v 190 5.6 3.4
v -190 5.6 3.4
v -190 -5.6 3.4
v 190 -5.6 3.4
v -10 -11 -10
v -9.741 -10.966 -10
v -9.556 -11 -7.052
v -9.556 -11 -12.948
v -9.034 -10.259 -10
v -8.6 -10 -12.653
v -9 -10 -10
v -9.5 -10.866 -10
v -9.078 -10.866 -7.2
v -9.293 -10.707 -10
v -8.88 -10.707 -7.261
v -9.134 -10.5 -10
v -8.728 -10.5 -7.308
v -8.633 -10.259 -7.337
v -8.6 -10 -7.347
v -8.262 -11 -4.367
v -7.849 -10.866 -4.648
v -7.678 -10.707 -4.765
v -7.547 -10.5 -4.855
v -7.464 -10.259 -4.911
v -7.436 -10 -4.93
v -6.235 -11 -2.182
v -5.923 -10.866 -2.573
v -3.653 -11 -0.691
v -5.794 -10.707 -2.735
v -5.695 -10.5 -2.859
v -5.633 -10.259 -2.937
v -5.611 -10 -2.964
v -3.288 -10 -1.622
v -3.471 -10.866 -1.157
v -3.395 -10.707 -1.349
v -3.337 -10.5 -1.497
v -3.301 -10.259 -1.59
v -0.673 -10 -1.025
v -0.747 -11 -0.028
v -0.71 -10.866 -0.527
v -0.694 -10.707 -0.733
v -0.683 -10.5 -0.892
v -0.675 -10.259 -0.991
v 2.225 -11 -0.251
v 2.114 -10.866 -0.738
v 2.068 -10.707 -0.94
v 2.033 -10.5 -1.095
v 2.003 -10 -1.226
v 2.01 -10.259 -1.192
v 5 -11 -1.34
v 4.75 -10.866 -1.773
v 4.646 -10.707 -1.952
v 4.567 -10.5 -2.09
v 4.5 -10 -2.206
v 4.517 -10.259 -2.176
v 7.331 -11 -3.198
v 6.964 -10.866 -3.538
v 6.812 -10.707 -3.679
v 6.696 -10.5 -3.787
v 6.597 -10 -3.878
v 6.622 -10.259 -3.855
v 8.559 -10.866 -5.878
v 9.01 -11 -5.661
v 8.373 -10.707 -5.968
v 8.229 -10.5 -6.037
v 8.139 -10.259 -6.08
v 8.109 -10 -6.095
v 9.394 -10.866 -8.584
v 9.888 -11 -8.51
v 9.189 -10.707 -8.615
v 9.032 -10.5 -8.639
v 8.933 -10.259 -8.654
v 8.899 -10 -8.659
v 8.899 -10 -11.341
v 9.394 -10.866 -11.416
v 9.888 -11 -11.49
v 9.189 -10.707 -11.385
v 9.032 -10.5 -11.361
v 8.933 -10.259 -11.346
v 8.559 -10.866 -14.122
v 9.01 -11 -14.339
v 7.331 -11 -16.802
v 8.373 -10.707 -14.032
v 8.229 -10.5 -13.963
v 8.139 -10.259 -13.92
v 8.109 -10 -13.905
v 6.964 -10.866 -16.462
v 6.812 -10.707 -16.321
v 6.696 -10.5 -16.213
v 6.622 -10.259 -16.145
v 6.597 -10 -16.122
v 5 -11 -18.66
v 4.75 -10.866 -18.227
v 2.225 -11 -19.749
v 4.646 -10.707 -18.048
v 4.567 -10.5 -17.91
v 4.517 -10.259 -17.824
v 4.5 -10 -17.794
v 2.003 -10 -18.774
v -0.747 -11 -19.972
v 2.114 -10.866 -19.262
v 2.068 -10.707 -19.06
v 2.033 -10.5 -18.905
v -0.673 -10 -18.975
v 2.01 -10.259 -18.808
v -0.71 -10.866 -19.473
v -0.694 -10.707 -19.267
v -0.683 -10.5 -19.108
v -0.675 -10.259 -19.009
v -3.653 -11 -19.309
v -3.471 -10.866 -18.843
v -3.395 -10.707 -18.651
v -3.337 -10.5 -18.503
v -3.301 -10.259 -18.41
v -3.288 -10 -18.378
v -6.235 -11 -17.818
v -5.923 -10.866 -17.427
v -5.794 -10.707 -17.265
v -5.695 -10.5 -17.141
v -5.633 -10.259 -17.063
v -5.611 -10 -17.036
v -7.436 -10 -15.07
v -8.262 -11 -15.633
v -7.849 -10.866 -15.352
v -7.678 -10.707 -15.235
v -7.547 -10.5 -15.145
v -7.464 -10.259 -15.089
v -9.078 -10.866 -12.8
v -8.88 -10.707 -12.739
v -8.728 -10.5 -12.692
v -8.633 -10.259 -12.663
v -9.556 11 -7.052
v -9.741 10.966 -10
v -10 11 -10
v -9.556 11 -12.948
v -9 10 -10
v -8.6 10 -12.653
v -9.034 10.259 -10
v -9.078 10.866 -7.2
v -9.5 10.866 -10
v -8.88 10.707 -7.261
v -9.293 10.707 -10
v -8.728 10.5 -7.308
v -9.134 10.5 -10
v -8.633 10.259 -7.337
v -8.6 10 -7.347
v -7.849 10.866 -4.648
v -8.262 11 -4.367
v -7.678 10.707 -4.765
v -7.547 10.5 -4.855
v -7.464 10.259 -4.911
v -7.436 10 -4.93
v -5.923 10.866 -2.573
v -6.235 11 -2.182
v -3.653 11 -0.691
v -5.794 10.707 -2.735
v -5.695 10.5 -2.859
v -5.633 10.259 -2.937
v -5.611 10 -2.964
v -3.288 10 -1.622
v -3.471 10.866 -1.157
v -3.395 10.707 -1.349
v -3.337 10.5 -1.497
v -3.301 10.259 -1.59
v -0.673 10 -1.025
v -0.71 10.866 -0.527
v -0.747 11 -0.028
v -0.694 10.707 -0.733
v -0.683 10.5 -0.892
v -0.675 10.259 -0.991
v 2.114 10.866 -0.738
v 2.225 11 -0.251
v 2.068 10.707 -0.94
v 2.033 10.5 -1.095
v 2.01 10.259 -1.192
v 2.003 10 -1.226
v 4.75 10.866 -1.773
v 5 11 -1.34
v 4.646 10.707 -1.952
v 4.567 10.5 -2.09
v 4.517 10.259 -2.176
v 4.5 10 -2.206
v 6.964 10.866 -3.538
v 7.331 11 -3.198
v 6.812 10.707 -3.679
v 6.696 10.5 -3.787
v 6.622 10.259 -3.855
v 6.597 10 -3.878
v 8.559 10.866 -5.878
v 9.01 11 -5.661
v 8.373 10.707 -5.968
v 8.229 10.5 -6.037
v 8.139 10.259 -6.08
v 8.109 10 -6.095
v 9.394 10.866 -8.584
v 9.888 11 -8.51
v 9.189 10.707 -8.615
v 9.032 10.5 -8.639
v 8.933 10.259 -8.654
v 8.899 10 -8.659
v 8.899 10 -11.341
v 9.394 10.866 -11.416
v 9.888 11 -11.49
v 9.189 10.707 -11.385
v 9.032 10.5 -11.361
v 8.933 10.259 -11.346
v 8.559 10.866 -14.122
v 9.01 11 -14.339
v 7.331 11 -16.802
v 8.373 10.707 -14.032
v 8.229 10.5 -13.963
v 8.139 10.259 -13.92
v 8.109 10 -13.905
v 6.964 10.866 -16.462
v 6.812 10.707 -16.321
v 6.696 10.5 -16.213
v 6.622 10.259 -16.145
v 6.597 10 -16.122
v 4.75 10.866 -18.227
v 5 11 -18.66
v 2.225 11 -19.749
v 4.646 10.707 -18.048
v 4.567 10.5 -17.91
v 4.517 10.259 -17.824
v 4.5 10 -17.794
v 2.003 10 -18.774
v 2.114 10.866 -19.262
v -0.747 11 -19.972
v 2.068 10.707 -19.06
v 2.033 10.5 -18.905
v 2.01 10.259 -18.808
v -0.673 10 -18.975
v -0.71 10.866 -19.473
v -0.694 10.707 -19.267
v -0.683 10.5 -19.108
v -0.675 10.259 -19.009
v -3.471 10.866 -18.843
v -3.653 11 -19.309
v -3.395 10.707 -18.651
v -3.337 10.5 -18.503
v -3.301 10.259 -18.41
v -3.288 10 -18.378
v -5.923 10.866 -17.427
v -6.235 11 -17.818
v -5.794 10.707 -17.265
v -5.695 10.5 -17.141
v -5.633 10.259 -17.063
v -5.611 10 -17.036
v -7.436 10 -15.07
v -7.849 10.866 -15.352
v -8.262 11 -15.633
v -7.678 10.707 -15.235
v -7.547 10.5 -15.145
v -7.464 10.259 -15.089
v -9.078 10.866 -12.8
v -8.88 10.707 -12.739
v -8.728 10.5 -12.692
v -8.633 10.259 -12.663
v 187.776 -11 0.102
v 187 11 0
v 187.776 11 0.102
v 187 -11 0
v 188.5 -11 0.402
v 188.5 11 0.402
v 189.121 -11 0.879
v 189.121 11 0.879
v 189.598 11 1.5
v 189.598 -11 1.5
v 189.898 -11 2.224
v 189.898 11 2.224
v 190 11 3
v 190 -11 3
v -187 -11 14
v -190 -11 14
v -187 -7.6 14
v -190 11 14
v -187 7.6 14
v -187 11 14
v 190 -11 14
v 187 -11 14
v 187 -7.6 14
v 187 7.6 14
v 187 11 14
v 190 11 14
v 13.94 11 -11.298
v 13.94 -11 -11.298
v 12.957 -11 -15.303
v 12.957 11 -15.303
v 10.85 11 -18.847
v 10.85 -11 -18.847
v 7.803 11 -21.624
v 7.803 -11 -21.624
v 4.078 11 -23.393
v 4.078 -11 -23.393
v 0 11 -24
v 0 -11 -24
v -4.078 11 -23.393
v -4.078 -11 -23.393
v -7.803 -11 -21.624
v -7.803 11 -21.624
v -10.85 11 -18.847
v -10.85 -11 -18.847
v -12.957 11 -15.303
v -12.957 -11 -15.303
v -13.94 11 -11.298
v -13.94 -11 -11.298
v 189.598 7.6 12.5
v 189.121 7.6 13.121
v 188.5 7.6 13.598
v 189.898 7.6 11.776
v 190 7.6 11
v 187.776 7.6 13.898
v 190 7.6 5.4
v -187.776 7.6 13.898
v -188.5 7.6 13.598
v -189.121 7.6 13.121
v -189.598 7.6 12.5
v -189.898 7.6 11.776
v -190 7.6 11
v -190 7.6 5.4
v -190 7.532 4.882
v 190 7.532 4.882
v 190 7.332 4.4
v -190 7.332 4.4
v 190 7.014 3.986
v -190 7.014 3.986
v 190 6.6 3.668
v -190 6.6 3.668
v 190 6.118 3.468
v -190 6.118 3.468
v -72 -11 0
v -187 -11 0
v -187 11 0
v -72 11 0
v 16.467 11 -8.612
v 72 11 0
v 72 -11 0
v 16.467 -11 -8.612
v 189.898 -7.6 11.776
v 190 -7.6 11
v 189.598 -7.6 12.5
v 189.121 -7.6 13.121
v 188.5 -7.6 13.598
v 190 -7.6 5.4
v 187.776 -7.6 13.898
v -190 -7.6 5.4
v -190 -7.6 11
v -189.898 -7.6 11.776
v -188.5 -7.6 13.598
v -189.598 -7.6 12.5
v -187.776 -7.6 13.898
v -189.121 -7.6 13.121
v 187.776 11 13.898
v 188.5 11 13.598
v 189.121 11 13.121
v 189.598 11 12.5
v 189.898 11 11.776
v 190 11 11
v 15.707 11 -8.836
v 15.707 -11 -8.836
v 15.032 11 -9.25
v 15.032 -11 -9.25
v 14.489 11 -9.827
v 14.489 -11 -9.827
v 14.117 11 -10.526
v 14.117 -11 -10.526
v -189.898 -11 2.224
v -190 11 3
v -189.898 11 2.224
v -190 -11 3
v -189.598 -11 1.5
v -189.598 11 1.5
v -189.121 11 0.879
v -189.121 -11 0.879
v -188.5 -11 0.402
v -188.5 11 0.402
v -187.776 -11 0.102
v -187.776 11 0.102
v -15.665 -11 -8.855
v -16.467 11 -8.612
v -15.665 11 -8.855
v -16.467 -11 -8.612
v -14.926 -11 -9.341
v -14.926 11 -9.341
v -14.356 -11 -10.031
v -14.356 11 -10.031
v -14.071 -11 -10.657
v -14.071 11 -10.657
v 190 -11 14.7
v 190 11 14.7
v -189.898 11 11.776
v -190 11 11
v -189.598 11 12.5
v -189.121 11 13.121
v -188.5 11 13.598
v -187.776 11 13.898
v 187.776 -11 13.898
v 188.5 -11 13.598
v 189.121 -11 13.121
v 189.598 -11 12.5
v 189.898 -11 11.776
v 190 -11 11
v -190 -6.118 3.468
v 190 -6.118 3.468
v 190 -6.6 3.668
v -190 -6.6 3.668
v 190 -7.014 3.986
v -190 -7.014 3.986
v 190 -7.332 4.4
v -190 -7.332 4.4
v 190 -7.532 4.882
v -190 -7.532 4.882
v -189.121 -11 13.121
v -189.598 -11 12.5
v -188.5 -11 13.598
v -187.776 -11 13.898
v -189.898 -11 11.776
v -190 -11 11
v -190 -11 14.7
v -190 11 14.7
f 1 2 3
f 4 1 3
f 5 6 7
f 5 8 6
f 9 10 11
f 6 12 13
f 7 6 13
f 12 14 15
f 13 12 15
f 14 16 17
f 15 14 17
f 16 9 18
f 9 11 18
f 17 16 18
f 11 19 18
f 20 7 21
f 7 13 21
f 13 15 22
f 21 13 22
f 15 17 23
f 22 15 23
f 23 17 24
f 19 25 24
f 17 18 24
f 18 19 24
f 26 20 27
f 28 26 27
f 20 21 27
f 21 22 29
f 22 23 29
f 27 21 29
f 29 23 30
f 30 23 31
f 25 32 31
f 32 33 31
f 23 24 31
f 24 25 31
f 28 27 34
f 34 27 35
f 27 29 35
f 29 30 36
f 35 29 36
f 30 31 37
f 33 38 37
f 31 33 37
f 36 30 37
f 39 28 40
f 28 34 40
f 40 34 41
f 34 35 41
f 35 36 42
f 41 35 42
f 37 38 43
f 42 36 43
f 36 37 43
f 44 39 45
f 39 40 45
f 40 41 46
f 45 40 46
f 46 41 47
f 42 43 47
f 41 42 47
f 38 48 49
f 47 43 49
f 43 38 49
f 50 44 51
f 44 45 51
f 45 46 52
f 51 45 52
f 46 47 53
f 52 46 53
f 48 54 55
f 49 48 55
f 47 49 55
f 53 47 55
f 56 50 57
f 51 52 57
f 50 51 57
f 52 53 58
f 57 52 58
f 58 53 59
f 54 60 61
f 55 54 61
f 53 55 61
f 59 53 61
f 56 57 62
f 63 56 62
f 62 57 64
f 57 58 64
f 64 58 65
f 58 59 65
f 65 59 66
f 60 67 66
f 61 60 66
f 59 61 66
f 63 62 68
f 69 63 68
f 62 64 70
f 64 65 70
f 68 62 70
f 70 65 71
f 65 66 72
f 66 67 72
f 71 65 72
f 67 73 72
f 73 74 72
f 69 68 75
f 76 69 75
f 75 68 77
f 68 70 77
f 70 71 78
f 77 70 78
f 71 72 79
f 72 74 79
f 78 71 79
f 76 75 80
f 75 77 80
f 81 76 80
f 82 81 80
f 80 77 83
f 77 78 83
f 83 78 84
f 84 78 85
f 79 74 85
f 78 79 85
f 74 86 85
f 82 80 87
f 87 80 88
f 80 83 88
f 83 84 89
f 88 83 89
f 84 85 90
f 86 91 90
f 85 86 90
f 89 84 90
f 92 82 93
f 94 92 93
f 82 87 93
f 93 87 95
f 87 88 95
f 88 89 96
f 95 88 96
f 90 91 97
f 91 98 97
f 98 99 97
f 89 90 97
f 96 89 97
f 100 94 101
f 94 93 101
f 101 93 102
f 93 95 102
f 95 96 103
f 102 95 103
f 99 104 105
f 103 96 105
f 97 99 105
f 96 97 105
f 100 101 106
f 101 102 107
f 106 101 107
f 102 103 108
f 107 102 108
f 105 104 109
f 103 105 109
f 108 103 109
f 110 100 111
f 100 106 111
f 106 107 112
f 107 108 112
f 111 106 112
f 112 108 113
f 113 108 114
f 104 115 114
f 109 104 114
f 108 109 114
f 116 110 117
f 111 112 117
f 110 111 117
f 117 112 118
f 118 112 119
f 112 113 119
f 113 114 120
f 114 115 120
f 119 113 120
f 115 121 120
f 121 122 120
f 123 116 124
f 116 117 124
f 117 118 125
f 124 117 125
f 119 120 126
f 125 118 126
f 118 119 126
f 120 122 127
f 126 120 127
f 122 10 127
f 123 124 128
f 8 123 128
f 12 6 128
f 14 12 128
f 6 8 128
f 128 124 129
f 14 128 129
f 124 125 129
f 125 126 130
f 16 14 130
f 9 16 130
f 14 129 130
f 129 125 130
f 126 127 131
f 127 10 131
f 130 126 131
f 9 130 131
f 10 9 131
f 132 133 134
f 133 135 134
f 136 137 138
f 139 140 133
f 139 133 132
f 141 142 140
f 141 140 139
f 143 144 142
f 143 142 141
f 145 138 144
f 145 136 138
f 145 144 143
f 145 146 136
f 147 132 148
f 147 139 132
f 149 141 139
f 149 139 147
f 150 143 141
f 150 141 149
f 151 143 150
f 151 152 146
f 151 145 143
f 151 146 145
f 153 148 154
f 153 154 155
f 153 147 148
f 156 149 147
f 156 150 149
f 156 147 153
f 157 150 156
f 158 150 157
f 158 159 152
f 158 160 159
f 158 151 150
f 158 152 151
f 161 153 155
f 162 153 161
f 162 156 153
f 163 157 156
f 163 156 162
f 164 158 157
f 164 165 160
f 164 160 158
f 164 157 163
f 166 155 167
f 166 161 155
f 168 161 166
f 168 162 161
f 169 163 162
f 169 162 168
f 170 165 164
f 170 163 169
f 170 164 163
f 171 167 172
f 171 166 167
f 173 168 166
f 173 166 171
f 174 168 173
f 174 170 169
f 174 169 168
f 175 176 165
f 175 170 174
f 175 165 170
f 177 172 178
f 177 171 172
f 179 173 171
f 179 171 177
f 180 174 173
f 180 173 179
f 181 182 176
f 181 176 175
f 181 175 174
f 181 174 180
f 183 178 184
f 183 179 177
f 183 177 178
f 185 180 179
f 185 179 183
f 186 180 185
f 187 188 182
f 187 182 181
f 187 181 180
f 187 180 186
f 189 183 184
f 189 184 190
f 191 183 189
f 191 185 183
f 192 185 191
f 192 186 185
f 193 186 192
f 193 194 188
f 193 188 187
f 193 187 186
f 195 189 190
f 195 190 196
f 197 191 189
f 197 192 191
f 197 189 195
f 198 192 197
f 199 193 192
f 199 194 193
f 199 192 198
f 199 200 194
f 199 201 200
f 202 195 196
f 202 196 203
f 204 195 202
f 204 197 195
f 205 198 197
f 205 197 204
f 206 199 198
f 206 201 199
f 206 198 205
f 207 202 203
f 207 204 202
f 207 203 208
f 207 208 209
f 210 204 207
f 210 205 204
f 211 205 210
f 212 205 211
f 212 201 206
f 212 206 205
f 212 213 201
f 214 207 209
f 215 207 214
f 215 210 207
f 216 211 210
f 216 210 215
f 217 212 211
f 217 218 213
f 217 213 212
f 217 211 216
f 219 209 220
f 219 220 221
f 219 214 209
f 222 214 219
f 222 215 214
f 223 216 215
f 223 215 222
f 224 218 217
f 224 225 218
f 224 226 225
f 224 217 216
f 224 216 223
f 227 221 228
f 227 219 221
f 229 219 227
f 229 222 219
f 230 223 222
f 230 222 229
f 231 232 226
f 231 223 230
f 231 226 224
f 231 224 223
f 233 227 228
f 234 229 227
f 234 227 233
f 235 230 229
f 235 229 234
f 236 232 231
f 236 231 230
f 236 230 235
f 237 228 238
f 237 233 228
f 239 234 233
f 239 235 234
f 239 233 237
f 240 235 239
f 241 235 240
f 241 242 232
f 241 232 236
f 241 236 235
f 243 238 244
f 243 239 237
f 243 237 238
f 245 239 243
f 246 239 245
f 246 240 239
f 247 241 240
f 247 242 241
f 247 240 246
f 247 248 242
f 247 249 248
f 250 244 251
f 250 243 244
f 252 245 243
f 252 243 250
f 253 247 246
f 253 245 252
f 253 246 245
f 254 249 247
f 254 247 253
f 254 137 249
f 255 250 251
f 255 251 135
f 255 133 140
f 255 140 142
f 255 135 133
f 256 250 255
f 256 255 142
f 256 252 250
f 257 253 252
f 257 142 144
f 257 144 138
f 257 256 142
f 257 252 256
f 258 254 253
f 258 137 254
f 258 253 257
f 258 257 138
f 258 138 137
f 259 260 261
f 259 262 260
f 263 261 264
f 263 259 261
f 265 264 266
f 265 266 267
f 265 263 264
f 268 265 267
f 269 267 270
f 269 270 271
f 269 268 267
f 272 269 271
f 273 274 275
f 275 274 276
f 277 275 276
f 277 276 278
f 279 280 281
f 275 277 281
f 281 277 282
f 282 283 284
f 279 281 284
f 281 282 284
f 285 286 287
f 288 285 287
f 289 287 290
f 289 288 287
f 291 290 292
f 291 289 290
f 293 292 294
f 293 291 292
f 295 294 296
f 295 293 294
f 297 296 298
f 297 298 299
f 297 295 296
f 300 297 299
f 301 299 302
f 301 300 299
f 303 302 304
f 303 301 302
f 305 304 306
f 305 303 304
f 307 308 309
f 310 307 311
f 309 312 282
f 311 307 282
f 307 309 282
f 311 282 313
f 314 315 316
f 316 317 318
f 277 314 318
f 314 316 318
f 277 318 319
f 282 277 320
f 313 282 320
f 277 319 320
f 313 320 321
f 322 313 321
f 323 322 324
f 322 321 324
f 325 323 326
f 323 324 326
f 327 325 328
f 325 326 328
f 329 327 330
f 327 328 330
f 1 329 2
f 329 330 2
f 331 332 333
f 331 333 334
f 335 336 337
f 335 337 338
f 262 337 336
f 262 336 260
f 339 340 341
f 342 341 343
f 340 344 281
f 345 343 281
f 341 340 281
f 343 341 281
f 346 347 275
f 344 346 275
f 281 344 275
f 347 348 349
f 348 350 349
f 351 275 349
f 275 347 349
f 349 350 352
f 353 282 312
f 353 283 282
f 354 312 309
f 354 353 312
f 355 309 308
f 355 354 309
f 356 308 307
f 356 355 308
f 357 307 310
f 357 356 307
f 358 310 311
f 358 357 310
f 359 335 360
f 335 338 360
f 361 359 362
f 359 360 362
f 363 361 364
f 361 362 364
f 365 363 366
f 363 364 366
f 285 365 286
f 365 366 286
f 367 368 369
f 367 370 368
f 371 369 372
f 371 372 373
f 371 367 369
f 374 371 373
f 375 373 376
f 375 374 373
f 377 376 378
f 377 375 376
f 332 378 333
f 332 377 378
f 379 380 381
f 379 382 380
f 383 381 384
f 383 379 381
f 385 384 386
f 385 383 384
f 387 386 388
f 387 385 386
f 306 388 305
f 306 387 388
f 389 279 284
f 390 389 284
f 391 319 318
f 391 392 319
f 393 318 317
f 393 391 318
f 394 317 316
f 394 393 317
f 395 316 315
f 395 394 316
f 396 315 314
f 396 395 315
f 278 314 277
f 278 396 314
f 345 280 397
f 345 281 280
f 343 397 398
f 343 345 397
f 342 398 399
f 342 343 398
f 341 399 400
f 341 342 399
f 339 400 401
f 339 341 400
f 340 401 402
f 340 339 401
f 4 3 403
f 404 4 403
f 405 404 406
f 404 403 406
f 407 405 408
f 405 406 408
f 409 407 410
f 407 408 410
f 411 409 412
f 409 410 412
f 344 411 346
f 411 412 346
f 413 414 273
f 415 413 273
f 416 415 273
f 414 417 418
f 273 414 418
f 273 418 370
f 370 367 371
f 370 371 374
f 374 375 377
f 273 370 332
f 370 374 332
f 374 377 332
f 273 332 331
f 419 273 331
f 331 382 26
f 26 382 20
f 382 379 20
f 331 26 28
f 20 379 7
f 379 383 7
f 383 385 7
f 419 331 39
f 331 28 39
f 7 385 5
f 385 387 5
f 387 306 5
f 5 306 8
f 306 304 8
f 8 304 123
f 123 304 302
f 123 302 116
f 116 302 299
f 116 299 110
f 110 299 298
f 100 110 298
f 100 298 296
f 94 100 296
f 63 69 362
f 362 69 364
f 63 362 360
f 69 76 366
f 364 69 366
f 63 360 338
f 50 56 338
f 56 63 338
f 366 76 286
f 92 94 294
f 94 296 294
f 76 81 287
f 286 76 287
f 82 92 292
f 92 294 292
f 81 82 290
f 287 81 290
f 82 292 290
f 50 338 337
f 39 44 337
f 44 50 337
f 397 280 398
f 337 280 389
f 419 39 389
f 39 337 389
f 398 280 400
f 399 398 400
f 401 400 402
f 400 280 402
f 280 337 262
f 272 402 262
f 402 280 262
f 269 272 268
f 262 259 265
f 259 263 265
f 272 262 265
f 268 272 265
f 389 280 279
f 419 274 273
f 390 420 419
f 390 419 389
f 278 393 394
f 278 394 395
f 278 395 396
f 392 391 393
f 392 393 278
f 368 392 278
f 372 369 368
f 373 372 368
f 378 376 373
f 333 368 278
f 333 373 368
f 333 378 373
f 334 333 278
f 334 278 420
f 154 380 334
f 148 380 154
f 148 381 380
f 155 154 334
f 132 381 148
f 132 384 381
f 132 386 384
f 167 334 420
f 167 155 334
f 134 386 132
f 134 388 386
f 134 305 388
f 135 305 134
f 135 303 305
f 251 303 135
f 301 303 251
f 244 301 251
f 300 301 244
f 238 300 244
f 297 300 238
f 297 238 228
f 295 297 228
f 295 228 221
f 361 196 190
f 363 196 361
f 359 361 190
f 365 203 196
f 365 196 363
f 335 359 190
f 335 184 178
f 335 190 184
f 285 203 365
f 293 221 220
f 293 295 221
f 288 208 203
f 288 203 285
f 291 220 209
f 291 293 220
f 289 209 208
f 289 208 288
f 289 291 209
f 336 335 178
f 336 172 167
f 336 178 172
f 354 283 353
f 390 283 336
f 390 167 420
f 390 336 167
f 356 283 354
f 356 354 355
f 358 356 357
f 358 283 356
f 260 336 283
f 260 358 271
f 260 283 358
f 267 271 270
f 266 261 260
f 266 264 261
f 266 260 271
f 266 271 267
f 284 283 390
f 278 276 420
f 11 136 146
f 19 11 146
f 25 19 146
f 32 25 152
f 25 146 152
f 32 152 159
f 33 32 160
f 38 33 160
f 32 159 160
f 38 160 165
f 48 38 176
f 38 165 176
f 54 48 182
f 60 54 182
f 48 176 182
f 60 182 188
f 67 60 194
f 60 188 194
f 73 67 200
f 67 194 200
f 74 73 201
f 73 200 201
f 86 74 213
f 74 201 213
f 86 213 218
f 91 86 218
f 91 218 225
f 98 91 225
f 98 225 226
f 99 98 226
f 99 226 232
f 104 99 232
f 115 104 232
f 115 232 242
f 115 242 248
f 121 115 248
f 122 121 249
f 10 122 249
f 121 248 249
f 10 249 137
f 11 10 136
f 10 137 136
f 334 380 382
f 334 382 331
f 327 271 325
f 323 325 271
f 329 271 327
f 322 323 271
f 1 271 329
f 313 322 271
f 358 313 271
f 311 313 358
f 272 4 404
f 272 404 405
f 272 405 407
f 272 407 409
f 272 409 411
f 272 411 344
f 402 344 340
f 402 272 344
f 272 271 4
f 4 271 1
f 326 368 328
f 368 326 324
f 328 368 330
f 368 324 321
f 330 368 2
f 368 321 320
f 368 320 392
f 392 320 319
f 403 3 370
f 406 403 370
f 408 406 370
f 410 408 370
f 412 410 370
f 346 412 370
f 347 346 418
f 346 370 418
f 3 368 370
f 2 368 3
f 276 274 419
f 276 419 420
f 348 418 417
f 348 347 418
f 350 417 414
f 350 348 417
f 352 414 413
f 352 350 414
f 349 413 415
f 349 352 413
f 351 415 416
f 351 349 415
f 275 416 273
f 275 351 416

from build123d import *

# Parameters (mm, degrees)
F1_W     = 380
F1_H     = 14
F2_DEPTH = 11
F4_DEPTH = 380.001
F5_R     = 9
F6_DEPTH = 22
F8_R     = 3
F7_W     = 380
F7_H     = 22
F9_DEPTH = 0.7
F10_R    = 1


with BuildPart() as f2:
    # F1 (on Front) → F2 (new body, symmetric)
    with BuildSketch(Plane.XZ):
        with Locations((0, 7)):
            Rectangle(F1_W, F1_H)
    extrude(amount=F2_DEPTH, both=True)

    # F3 (on face) → F4 (cut, through all)
    with BuildSketch(Plane(origin=(-190, 0, 0), x_dir=(0, -1, 0), z_dir=(-1, 0, 0))):
        with BuildLine():
            Line((7.6, 14), (-7.6, 14))
            Line((-7.6, 14), (-7.6, 5.4))
            ThreePointArc((-7.6, 5.4), (-7.0142135624, 3.9857864376), (-5.6, 3.4))
            Line((-5.6, 3.4), (5.6, 3.4))
            ThreePointArc((5.6, 3.4), (7.0142135624, 3.9857864376), (7.6, 5.4))
            Line((7.6, 5.4), (7.6, 14))
        make_face()
    extrude(amount=-F4_DEPTH, mode=Mode.SUBTRACT)

    # F5 (on face) → F6 (join, through all)
    with BuildSketch(Plane(origin=(0, 11, 0), x_dir=(-1, 0, 0), z_dir=(0, 1, 0))):
        with BuildLine():
            Line((-9.7979589711, 0), (-72, 0))
            Line((-72, 0), (-13.9642400438, -9))
            ThreePointArc((-13.9642400438, -9), (-12.7047442125, -4.118718295), (-9.7979589711, 0))
        make_face()
        with BuildLine():
            ThreePointArc((-9.7979589711, 0), (-12.7047442125, -4.118718295), (-13.9642400438, -9))
            ThreePointArc((-13.9642400438, -9), (-0.5003195915, -23.9910571547), (14, -10))
            ThreePointArc((14, -10), (13.9910571547, -9.4996804085), (13.9642400438, -9))
            ThreePointArc((13.9642400438, -9), (12.7047442125, -4.118718295), (9.7979589711, 0))
            Line((9.7979589711, 0), (-9.7979589711, 0))
        make_face()
        with Locations((0, -10)):
            Circle(F5_R, mode=Mode.SUBTRACT)
        with BuildLine():
            Line((72, 0), (9.7979589711, 0))
            ThreePointArc((9.7979589711, 0), (12.7047442125, -4.118718295), (13.9642400438, -9))
            Line((13.9642400438, -9), (72, 0))
        make_face()
    extrude(amount=-F6_DEPTH)

    # F8
    f8_edges = [f2.edges().sort_by_distance(p)[0] for p in [
        (190, -9.3, 14),
        (190, 9.3, 14),
        (190, 0, 0),
        (-190, -9.3, 14),
        (-190, 9.3, 14),
        (-190, 0, 0),
        (13.96424, 0, -9),
        (-13.96424, 0, -9),
    ]]
    fillet(f8_edges, radius=F8_R)

    # F7 (on face) → F9 (join)
    with BuildSketch(Plane.XY.offset(14)):
        Rectangle(F7_W, F7_H)
    extrude(amount=F9_DEPTH)

    # F10
    f10_edges = [f2.edges().sort_by_distance(p)[0] for p in [
        (-9, 0, -10),
        (9, 11, -10),
        (9, -11, -10),
    ]]
    fillet(f10_edges, radius=F10_R)


solid = f2.part
